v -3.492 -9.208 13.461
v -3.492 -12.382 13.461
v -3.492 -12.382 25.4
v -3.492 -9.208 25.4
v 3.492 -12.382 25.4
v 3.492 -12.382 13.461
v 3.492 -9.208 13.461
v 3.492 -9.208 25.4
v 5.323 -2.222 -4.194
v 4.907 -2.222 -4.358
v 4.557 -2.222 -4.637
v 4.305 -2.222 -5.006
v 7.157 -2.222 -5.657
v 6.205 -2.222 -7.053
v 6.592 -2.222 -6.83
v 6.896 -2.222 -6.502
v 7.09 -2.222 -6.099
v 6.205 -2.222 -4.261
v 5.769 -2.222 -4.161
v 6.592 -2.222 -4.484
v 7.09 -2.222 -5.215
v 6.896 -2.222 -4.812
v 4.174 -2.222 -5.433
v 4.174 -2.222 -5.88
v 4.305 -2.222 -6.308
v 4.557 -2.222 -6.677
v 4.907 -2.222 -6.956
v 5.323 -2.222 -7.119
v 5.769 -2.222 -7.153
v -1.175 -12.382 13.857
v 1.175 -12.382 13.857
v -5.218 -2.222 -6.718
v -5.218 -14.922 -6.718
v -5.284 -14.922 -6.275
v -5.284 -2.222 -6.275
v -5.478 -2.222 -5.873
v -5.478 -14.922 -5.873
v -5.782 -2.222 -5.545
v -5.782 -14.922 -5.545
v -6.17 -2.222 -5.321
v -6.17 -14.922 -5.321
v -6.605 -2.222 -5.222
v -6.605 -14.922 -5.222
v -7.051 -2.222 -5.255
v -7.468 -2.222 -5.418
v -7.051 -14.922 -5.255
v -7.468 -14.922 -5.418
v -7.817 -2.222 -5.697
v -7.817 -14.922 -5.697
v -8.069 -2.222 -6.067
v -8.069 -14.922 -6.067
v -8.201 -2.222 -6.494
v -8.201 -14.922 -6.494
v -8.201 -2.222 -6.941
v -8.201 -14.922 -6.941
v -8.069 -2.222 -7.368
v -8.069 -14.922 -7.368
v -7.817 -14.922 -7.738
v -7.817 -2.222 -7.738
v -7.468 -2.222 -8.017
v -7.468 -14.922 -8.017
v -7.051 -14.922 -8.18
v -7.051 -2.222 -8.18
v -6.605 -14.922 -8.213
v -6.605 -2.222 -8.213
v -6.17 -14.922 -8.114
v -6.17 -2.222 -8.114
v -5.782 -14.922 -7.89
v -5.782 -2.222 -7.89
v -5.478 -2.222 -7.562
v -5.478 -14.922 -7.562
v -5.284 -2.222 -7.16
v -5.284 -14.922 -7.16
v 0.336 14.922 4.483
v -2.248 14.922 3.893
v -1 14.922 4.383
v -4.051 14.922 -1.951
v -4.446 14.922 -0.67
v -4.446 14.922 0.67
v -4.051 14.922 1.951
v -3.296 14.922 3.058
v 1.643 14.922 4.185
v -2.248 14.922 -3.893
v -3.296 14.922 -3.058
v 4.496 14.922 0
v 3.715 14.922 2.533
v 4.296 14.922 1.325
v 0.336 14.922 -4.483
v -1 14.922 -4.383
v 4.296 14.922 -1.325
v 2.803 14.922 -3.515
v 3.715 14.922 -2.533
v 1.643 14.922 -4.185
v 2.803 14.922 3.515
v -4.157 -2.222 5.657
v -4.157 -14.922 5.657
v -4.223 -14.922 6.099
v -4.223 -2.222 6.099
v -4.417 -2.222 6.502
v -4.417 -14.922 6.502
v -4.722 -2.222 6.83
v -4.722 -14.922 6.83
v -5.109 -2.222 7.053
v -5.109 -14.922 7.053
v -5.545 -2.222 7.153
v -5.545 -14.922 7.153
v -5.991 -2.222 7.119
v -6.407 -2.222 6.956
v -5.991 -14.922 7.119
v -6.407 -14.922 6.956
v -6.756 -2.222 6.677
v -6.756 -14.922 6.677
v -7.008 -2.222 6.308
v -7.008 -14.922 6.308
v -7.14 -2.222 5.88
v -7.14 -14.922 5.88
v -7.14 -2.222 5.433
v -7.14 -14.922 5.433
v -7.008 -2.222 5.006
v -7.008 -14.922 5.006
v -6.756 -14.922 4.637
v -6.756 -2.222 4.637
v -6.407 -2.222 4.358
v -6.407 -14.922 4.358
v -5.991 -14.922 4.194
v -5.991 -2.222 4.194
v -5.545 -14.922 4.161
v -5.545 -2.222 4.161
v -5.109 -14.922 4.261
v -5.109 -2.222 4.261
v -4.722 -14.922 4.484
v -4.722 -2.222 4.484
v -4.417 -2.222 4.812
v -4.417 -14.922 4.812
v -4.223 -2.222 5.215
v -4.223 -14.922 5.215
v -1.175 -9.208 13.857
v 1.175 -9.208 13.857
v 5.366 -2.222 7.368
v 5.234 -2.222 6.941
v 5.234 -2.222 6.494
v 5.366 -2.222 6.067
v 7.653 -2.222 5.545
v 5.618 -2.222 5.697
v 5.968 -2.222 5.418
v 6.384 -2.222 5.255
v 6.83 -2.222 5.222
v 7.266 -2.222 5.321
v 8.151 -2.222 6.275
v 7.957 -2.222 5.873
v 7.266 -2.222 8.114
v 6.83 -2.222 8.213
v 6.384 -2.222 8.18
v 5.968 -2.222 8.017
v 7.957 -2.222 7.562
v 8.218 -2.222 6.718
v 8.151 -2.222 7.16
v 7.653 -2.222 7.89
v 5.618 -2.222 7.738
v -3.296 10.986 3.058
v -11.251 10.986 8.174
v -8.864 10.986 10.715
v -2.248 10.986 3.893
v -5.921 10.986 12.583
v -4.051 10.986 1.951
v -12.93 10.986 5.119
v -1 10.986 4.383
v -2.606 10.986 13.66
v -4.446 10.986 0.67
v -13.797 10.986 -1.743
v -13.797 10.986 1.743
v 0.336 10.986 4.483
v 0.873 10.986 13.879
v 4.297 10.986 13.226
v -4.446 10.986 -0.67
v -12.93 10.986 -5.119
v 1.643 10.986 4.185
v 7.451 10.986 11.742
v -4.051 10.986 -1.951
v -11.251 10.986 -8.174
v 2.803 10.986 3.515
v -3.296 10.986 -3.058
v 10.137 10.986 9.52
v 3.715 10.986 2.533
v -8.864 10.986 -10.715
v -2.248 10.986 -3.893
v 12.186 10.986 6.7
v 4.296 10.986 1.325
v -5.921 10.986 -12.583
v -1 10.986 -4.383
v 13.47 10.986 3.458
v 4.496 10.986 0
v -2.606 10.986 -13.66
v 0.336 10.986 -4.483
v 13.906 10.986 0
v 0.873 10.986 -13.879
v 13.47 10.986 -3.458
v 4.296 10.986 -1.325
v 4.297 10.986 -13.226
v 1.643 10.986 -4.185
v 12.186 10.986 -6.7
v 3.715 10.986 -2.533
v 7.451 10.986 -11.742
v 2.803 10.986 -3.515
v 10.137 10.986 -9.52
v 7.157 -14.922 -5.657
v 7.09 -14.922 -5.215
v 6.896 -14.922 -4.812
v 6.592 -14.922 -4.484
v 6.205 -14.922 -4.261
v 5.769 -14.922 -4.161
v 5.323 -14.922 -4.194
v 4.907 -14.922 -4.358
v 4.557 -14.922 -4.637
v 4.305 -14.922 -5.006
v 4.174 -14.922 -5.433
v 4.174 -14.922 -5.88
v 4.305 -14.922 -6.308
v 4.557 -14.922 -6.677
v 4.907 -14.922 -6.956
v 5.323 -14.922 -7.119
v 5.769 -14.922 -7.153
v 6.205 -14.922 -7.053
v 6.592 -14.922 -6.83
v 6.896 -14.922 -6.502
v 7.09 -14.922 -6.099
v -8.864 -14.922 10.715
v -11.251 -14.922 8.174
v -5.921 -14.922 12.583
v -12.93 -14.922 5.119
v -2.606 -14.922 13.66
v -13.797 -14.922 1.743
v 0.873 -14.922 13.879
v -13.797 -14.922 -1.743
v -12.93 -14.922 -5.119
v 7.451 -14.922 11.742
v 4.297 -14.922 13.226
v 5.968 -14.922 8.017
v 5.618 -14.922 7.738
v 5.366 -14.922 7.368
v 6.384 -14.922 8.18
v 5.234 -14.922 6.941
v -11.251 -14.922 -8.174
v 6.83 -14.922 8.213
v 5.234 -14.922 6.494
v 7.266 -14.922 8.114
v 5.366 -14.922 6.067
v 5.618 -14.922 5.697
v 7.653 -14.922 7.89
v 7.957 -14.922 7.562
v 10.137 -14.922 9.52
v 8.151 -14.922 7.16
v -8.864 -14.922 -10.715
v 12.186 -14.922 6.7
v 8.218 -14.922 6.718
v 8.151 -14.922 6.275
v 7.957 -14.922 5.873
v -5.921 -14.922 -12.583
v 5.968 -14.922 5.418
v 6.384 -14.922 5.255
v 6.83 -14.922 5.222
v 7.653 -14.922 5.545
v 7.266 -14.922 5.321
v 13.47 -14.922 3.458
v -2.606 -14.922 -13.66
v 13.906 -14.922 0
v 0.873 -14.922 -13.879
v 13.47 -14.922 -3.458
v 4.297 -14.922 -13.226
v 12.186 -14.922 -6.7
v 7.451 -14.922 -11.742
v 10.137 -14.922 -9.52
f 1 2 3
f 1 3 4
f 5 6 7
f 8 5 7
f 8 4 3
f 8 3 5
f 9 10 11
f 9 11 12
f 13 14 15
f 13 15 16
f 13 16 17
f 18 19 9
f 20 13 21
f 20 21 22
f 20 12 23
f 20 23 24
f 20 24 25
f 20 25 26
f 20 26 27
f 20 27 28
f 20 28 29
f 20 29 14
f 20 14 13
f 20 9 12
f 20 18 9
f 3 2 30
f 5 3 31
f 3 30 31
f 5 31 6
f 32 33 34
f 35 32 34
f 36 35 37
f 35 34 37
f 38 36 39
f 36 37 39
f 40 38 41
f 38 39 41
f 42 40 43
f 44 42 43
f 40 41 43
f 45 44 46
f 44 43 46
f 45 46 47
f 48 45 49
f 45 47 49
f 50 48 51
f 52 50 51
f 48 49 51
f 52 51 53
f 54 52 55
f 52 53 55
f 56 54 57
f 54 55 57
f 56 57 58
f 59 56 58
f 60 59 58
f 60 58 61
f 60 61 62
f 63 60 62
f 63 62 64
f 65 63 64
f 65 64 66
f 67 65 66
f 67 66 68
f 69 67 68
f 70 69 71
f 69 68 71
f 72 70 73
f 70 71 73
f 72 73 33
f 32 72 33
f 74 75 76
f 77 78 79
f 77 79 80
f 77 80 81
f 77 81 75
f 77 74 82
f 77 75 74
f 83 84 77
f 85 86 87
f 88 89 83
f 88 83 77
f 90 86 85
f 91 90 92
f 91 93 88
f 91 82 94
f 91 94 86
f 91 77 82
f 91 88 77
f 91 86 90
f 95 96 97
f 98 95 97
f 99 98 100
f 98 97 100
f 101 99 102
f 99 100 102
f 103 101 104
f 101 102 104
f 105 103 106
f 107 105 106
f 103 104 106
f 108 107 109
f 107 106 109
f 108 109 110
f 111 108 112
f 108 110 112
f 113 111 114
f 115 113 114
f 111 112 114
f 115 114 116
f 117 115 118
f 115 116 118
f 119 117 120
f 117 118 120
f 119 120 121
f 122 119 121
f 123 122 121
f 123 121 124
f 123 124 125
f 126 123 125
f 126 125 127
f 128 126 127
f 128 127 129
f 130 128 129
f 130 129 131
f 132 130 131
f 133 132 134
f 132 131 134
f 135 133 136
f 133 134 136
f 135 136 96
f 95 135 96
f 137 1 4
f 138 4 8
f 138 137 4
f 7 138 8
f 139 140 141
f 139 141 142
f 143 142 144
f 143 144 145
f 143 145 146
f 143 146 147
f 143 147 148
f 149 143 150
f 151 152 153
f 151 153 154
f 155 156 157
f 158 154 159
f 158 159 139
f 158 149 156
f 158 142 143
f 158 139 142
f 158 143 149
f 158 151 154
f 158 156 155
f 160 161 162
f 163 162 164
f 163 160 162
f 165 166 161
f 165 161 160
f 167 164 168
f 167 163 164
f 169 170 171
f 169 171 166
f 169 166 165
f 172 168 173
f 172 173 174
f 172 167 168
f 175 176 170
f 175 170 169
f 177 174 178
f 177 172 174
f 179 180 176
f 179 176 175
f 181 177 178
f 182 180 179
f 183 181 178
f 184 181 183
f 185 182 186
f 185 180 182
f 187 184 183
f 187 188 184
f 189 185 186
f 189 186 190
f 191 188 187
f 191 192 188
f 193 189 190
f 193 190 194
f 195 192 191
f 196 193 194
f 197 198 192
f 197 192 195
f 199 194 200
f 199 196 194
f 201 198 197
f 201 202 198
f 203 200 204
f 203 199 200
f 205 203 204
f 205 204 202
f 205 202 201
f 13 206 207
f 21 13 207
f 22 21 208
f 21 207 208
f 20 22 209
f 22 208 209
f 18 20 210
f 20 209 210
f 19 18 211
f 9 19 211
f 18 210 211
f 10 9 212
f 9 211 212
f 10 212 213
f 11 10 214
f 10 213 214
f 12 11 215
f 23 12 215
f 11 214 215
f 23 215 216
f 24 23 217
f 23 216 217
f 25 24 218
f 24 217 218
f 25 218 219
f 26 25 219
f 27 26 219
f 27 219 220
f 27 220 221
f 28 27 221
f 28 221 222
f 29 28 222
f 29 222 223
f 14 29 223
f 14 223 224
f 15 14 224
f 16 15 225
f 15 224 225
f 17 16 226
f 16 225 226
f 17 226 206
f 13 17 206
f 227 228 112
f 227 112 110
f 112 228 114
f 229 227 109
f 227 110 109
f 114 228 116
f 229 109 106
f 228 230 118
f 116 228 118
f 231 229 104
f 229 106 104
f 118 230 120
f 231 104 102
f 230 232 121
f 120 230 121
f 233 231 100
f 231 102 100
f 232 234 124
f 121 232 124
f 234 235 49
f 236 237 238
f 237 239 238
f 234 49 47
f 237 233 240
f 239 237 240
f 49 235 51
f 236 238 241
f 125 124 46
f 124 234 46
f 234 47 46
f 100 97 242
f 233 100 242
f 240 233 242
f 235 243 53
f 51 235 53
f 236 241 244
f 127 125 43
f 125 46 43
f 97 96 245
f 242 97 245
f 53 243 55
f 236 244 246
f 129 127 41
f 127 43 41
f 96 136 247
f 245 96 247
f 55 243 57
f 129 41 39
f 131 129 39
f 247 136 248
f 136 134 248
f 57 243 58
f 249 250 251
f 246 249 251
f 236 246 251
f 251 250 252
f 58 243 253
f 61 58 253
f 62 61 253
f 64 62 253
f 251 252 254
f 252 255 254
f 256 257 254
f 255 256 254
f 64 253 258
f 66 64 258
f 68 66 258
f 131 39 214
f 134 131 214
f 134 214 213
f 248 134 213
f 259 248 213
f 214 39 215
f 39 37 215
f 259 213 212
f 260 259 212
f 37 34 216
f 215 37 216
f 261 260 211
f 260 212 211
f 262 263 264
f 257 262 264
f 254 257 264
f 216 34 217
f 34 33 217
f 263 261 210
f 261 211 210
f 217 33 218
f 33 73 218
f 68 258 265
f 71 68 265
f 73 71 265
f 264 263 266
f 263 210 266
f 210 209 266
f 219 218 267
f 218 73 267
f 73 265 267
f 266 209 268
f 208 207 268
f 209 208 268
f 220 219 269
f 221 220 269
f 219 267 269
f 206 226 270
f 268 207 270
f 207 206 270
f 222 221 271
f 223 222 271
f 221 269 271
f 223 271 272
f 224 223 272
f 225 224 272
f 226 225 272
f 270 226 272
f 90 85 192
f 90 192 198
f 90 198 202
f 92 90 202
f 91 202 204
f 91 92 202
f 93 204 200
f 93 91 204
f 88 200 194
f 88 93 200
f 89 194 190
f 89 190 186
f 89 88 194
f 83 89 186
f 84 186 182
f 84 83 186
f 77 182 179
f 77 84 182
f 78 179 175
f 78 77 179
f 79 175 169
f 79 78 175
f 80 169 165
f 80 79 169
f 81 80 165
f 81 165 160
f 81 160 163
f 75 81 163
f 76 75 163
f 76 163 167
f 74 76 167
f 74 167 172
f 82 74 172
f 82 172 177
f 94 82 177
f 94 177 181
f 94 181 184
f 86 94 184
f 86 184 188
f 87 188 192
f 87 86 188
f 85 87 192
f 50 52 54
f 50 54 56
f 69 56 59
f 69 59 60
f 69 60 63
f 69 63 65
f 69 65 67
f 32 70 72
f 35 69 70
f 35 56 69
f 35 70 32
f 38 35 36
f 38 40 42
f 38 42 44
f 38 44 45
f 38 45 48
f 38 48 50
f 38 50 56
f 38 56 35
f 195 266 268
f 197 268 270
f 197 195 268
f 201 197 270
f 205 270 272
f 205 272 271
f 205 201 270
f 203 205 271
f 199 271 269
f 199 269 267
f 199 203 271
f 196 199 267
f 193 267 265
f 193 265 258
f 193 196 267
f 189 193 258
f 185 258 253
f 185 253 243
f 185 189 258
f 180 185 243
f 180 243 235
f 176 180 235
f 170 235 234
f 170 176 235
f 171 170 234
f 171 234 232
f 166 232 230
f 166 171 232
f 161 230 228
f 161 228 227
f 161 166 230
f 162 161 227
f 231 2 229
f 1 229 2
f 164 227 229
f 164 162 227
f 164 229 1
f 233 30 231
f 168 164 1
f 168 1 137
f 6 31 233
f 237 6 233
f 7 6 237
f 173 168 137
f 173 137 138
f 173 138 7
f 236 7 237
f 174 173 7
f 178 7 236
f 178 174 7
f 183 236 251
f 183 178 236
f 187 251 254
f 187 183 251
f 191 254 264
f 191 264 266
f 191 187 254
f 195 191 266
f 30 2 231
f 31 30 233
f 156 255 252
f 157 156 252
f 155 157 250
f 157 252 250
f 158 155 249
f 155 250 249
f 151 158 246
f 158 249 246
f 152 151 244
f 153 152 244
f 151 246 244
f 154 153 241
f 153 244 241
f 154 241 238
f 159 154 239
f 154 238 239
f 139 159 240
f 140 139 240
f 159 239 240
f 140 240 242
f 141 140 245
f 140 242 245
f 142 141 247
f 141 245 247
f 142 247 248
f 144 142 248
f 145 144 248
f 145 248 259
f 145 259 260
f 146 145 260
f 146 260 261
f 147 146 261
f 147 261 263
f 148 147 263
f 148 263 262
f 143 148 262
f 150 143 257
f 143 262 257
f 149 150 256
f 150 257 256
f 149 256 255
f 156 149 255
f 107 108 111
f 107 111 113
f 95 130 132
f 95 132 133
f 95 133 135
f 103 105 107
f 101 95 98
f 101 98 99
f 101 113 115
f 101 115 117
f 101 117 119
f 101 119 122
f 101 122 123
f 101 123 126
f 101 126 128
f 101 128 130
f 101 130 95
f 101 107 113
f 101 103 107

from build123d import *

# Parameters (mm, degrees)
SKETCH1_R           = 13.9065
BOSS_EXTRUDE1_DEPTH = 14.9225
SKETCH2_R           = 13.9065
SKETCH2_R_2         = 4.4958
CUT_EXTRUDE1_DEPTH  = 3.937
SKETCH3_W           = 6.985
SKETCH3_H           = 3.175
BOSS_EXTRUDE2_DEPTH = 25.4
SKETCH4_R           = 1.5
CUT_EXTRUDE2_DEPTH  = 12.7


with BuildPart() as part:
    # Sketch1 → Boss-Extrude1 (new body, symmetric)
    with BuildSketch(Plane(origin=(0, 0, 0), x_dir=(1, 0, 0), z_dir=(0, 1, 0))):
        Circle(SKETCH1_R)
    extrude(amount=BOSS_EXTRUDE1_DEPTH, both=True)

    # Sketch2 → Cut-Extrude1 (cut)
    with BuildSketch(Plane(origin=(0, 14.9225, 0), x_dir=(1, 0, 0), z_dir=(0, 1, 0))):
        Circle(SKETCH2_R)
        Circle(SKETCH2_R_2, mode=Mode.SUBTRACT)
    extrude(amount=-CUT_EXTRUDE1_DEPTH, mode=Mode.SUBTRACT)

    # Sketch3 → Boss-Extrude2 (add)
    with BuildSketch(Plane.XY):
        with Locations((0, -10.795)):
            Rectangle(SKETCH3_W, SKETCH3_H)
    extrude(amount=BOSS_EXTRUDE2_DEPTH)

    # Sketch4 → Cut-Extrude2 (cut)
    with BuildSketch(Plane.XZ.offset(14.9225)):
        with Locations((-5.656854249, 5.656854249)):
            Circle(SKETCH4_R)
        with Locations((6.717514421, 6.717514421)):
            Circle(SKETCH4_R)
        with Locations((5.656854249, -5.656854249)):
            Circle(SKETCH4_R)
        with Locations((-6.717514421, -6.717514421)):
            Circle(SKETCH4_R)
    extrude(amount=-CUT_EXTRUDE2_DEPTH, mode=Mode.SUBTRACT)


solid = part.part
